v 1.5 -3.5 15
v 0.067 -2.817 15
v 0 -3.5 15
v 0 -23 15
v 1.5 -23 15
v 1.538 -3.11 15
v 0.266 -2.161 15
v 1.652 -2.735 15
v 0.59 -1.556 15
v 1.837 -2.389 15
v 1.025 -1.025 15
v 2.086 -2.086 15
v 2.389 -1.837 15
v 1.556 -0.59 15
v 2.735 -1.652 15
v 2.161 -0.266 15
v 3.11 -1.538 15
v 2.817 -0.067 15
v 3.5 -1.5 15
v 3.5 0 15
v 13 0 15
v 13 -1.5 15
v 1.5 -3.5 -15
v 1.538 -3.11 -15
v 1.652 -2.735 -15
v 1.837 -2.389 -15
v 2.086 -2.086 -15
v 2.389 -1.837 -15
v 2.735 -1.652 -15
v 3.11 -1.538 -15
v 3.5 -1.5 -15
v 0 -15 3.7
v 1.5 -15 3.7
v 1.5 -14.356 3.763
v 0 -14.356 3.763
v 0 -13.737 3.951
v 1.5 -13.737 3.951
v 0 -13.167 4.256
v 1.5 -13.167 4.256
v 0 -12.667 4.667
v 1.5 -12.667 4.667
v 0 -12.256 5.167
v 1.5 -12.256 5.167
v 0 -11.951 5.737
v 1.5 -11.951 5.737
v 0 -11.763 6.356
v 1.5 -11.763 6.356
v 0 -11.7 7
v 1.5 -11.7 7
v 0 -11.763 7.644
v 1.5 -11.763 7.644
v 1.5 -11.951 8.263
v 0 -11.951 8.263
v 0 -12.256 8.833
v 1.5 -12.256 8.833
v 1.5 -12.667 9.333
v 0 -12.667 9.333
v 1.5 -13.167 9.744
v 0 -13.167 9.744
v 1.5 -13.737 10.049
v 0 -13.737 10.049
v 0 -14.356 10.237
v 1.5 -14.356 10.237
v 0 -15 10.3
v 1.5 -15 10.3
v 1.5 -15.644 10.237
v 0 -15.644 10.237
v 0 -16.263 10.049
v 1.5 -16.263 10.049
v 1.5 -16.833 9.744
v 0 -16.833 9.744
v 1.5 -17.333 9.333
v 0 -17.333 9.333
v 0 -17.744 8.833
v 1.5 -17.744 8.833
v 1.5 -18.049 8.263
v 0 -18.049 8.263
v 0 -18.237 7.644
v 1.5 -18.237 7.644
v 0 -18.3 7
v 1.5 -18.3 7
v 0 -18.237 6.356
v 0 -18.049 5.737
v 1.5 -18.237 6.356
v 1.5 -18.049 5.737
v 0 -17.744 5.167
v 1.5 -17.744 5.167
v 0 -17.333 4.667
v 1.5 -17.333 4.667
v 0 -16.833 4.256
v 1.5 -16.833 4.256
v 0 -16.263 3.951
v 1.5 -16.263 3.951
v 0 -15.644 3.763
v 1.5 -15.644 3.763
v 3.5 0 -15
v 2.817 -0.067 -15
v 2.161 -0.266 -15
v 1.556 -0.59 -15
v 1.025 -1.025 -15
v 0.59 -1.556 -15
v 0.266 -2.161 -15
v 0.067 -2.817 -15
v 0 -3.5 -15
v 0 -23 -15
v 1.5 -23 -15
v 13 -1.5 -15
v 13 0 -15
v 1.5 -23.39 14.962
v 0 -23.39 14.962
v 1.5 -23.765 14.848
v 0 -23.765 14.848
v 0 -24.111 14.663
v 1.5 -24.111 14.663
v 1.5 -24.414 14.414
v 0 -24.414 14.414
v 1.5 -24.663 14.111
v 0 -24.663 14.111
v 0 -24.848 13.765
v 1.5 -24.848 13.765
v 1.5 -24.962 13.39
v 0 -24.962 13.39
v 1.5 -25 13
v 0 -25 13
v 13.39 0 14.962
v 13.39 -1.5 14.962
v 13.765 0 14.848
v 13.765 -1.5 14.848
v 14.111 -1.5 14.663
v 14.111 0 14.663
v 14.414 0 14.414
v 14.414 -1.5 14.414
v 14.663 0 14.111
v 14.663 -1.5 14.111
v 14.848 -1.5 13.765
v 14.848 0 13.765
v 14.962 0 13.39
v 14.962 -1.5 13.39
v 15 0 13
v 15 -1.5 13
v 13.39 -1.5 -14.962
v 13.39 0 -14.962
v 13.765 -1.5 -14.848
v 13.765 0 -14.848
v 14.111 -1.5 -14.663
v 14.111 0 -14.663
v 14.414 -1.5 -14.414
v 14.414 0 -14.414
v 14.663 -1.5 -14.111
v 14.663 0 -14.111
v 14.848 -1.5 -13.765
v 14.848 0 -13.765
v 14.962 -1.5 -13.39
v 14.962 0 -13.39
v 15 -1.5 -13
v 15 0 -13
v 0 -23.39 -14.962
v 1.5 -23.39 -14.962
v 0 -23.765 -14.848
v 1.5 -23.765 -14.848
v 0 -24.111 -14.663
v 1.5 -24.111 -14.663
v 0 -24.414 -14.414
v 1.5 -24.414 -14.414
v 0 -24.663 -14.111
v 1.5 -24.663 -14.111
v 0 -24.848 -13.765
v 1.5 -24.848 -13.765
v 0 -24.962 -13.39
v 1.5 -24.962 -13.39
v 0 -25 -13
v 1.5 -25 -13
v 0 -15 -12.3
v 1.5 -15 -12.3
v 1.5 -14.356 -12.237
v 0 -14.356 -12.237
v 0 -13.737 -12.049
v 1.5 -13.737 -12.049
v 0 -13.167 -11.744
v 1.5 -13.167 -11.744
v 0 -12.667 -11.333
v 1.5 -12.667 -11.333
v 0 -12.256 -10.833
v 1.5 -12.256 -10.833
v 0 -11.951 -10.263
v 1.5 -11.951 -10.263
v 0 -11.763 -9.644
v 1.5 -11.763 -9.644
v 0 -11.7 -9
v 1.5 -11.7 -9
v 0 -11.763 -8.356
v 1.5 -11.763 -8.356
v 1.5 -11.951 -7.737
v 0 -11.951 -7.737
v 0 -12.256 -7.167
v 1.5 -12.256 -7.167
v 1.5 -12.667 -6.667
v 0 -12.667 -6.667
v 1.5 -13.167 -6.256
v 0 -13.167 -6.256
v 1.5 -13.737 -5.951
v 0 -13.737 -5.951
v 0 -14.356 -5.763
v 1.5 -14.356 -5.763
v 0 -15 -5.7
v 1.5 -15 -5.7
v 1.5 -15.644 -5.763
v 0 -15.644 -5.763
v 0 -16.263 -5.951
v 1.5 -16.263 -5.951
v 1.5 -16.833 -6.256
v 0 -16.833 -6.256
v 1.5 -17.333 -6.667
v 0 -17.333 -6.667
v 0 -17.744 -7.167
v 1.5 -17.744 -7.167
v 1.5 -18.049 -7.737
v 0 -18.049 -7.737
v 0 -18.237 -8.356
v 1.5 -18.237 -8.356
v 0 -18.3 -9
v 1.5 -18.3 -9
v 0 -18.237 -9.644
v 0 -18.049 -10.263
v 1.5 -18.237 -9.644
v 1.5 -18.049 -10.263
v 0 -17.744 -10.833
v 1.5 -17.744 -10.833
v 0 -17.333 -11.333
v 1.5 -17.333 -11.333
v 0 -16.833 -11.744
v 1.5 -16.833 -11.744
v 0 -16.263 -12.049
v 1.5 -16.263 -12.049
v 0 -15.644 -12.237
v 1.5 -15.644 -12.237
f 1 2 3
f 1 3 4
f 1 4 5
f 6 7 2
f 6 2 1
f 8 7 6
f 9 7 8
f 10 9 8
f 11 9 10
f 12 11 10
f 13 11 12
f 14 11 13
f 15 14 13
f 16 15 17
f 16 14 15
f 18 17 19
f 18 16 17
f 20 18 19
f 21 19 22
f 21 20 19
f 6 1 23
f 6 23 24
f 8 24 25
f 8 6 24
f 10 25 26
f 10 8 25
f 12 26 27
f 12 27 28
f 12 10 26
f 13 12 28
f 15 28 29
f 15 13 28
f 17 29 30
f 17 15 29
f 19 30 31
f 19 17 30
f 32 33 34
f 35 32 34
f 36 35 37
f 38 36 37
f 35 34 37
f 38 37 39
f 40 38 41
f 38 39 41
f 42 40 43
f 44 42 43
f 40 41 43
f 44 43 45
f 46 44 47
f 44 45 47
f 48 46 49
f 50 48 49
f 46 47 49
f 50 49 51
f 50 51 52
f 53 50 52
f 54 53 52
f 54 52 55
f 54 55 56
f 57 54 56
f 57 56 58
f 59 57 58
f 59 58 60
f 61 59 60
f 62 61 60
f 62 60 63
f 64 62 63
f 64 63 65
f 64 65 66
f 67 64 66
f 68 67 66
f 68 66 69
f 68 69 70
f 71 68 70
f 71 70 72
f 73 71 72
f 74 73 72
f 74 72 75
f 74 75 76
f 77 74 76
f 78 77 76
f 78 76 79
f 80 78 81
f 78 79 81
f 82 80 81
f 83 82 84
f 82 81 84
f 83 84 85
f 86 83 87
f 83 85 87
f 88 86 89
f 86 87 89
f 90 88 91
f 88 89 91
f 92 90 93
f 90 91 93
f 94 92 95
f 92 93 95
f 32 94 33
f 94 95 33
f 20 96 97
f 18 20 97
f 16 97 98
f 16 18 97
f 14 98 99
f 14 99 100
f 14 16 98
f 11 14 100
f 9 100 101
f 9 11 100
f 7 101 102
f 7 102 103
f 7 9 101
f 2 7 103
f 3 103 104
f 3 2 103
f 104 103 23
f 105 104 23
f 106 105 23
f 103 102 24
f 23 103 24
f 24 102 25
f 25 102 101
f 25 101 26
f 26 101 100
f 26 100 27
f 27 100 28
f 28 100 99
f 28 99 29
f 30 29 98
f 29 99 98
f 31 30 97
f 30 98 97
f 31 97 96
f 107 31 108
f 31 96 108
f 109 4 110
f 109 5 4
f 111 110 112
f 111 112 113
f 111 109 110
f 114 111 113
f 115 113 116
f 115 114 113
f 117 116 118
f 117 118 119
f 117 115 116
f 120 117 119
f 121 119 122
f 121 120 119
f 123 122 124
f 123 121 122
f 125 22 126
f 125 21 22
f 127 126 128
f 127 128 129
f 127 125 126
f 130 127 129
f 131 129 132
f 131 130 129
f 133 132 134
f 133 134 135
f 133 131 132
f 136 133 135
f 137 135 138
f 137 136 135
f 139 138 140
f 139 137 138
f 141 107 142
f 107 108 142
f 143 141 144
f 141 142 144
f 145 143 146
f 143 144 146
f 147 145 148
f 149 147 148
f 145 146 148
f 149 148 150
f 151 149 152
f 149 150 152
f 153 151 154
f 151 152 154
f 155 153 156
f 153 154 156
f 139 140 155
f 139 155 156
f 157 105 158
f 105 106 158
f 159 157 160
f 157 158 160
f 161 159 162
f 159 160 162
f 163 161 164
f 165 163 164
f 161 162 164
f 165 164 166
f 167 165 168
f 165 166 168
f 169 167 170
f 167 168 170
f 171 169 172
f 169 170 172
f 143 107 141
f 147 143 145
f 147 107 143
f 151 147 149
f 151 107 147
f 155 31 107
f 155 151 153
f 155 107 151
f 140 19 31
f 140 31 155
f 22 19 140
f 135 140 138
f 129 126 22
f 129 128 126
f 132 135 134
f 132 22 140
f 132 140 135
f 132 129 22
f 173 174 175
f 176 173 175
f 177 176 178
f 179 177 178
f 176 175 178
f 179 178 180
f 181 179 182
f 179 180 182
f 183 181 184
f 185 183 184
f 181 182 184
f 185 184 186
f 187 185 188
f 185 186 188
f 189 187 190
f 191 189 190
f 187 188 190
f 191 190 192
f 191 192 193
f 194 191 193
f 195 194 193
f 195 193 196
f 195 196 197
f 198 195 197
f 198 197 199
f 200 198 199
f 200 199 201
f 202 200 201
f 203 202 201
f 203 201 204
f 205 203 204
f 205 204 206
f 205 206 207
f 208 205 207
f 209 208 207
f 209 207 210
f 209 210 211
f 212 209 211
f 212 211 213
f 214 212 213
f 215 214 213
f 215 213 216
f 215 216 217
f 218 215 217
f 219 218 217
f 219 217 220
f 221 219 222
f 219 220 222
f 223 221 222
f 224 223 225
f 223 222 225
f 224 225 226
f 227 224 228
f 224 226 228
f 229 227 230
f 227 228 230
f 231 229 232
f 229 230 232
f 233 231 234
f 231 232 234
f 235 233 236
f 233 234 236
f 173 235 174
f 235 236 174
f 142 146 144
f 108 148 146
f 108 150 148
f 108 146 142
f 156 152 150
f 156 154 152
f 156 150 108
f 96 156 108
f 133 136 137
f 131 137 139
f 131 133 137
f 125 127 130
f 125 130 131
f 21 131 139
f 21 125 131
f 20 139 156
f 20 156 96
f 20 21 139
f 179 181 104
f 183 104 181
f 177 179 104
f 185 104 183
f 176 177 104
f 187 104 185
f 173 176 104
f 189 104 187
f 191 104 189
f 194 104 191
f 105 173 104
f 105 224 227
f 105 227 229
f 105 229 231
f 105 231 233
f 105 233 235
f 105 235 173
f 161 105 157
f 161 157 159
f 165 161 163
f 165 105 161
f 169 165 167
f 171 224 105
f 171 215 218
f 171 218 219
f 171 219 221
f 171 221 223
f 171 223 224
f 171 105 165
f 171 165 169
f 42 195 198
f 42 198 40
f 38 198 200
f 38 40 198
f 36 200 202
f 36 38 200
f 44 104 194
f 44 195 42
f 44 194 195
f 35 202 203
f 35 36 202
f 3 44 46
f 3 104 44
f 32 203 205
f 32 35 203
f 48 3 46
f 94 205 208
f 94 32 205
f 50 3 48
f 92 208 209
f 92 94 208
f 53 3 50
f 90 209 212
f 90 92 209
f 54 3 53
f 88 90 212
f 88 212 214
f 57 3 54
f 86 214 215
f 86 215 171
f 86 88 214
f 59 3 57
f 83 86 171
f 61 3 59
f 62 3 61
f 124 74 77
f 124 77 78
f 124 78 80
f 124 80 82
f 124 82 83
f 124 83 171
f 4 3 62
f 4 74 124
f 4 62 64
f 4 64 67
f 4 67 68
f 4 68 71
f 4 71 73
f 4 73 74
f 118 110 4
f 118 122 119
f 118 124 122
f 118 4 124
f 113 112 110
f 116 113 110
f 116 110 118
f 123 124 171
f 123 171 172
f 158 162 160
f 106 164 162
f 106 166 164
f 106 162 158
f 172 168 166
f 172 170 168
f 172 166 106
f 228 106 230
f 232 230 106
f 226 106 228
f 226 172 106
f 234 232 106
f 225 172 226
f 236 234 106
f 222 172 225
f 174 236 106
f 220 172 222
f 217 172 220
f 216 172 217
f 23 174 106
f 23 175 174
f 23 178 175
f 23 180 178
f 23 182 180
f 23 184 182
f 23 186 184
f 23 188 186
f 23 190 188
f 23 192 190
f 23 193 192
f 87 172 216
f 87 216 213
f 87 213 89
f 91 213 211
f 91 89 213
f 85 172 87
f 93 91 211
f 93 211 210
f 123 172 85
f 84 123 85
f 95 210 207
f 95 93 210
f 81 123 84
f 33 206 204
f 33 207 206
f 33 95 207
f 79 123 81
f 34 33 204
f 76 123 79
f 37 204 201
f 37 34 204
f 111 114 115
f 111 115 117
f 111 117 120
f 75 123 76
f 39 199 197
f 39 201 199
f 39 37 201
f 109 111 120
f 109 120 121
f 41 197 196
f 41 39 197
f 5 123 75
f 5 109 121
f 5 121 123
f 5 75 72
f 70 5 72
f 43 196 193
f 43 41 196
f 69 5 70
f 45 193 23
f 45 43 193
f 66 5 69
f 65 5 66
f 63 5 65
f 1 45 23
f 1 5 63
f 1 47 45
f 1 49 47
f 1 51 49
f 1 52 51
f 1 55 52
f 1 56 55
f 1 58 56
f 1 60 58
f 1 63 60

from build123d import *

# Parameters (mm, degrees)
ODGI_CIE_BAZOWE1_DEPTH  = 15
OTW_R_POD_RUB_M61_D     = 6.6
OTW_R_POD_RUB_M61_DEPTH = 10
OTW_R_POD_RUB_M61_TIP   = 1.982840043
ZAOKR_GLENIE1_R         = 2


# Sheet-metal steps are written as plain solids
with BuildPart() as part:
    # Szkic1 → Odgięcie bazowe1 (new, symmetric)
    with BuildSketch(Plane.XY):
        with BuildLine():
            Line((15, 0), (3.5, 0))
            ThreePointArc((3.5, 0), (1.025126266, -1.025126266), (0, -3.5))
            Line((0, -3.5), (0, -25))
            Line((0, -25), (1.5, -25))
            Line((1.5, -25), (1.5, -3.5))
            ThreePointArc((1.5, -3.5), (2.085786438, -2.085786438), (3.5, -1.5))
            Line((3.5, -1.5), (15, -1.5))
            Line((15, -1.5), (15, 0))
        make_face()
    extrude(amount=ODGI_CIE_BAZOWE1_DEPTH, both=True)

    # Otwór pod śrubę M61
    with Locations(Plane.ZY):
        with Locations((-9, -15), (7, -15)):
            Hole(OTW_R_POD_RUB_M61_D / 2, depth=OTW_R_POD_RUB_M61_DEPTH)
            with Locations((0, 0, -(OTW_R_POD_RUB_M61_DEPTH + OTW_R_POD_RUB_M61_TIP / 2))):  # 118° drill point
                Cone(0, OTW_R_POD_RUB_M61_D / 2, OTW_R_POD_RUB_M61_TIP, mode=Mode.SUBTRACT)

    # Zaokrąglenie1
    zaokr_glenie1_edges = [part.edges().sort_by_distance(p)[0] for p in [
        (0.75, -25, 15),
        (0.75, -25, -15),
        (15, -0.75, 15),
        (15, -0.75, -15),
    ]]
    fillet(zaokr_glenie1_edges, radius=ZAOKR_GLENIE1_R)


solid = part.part
